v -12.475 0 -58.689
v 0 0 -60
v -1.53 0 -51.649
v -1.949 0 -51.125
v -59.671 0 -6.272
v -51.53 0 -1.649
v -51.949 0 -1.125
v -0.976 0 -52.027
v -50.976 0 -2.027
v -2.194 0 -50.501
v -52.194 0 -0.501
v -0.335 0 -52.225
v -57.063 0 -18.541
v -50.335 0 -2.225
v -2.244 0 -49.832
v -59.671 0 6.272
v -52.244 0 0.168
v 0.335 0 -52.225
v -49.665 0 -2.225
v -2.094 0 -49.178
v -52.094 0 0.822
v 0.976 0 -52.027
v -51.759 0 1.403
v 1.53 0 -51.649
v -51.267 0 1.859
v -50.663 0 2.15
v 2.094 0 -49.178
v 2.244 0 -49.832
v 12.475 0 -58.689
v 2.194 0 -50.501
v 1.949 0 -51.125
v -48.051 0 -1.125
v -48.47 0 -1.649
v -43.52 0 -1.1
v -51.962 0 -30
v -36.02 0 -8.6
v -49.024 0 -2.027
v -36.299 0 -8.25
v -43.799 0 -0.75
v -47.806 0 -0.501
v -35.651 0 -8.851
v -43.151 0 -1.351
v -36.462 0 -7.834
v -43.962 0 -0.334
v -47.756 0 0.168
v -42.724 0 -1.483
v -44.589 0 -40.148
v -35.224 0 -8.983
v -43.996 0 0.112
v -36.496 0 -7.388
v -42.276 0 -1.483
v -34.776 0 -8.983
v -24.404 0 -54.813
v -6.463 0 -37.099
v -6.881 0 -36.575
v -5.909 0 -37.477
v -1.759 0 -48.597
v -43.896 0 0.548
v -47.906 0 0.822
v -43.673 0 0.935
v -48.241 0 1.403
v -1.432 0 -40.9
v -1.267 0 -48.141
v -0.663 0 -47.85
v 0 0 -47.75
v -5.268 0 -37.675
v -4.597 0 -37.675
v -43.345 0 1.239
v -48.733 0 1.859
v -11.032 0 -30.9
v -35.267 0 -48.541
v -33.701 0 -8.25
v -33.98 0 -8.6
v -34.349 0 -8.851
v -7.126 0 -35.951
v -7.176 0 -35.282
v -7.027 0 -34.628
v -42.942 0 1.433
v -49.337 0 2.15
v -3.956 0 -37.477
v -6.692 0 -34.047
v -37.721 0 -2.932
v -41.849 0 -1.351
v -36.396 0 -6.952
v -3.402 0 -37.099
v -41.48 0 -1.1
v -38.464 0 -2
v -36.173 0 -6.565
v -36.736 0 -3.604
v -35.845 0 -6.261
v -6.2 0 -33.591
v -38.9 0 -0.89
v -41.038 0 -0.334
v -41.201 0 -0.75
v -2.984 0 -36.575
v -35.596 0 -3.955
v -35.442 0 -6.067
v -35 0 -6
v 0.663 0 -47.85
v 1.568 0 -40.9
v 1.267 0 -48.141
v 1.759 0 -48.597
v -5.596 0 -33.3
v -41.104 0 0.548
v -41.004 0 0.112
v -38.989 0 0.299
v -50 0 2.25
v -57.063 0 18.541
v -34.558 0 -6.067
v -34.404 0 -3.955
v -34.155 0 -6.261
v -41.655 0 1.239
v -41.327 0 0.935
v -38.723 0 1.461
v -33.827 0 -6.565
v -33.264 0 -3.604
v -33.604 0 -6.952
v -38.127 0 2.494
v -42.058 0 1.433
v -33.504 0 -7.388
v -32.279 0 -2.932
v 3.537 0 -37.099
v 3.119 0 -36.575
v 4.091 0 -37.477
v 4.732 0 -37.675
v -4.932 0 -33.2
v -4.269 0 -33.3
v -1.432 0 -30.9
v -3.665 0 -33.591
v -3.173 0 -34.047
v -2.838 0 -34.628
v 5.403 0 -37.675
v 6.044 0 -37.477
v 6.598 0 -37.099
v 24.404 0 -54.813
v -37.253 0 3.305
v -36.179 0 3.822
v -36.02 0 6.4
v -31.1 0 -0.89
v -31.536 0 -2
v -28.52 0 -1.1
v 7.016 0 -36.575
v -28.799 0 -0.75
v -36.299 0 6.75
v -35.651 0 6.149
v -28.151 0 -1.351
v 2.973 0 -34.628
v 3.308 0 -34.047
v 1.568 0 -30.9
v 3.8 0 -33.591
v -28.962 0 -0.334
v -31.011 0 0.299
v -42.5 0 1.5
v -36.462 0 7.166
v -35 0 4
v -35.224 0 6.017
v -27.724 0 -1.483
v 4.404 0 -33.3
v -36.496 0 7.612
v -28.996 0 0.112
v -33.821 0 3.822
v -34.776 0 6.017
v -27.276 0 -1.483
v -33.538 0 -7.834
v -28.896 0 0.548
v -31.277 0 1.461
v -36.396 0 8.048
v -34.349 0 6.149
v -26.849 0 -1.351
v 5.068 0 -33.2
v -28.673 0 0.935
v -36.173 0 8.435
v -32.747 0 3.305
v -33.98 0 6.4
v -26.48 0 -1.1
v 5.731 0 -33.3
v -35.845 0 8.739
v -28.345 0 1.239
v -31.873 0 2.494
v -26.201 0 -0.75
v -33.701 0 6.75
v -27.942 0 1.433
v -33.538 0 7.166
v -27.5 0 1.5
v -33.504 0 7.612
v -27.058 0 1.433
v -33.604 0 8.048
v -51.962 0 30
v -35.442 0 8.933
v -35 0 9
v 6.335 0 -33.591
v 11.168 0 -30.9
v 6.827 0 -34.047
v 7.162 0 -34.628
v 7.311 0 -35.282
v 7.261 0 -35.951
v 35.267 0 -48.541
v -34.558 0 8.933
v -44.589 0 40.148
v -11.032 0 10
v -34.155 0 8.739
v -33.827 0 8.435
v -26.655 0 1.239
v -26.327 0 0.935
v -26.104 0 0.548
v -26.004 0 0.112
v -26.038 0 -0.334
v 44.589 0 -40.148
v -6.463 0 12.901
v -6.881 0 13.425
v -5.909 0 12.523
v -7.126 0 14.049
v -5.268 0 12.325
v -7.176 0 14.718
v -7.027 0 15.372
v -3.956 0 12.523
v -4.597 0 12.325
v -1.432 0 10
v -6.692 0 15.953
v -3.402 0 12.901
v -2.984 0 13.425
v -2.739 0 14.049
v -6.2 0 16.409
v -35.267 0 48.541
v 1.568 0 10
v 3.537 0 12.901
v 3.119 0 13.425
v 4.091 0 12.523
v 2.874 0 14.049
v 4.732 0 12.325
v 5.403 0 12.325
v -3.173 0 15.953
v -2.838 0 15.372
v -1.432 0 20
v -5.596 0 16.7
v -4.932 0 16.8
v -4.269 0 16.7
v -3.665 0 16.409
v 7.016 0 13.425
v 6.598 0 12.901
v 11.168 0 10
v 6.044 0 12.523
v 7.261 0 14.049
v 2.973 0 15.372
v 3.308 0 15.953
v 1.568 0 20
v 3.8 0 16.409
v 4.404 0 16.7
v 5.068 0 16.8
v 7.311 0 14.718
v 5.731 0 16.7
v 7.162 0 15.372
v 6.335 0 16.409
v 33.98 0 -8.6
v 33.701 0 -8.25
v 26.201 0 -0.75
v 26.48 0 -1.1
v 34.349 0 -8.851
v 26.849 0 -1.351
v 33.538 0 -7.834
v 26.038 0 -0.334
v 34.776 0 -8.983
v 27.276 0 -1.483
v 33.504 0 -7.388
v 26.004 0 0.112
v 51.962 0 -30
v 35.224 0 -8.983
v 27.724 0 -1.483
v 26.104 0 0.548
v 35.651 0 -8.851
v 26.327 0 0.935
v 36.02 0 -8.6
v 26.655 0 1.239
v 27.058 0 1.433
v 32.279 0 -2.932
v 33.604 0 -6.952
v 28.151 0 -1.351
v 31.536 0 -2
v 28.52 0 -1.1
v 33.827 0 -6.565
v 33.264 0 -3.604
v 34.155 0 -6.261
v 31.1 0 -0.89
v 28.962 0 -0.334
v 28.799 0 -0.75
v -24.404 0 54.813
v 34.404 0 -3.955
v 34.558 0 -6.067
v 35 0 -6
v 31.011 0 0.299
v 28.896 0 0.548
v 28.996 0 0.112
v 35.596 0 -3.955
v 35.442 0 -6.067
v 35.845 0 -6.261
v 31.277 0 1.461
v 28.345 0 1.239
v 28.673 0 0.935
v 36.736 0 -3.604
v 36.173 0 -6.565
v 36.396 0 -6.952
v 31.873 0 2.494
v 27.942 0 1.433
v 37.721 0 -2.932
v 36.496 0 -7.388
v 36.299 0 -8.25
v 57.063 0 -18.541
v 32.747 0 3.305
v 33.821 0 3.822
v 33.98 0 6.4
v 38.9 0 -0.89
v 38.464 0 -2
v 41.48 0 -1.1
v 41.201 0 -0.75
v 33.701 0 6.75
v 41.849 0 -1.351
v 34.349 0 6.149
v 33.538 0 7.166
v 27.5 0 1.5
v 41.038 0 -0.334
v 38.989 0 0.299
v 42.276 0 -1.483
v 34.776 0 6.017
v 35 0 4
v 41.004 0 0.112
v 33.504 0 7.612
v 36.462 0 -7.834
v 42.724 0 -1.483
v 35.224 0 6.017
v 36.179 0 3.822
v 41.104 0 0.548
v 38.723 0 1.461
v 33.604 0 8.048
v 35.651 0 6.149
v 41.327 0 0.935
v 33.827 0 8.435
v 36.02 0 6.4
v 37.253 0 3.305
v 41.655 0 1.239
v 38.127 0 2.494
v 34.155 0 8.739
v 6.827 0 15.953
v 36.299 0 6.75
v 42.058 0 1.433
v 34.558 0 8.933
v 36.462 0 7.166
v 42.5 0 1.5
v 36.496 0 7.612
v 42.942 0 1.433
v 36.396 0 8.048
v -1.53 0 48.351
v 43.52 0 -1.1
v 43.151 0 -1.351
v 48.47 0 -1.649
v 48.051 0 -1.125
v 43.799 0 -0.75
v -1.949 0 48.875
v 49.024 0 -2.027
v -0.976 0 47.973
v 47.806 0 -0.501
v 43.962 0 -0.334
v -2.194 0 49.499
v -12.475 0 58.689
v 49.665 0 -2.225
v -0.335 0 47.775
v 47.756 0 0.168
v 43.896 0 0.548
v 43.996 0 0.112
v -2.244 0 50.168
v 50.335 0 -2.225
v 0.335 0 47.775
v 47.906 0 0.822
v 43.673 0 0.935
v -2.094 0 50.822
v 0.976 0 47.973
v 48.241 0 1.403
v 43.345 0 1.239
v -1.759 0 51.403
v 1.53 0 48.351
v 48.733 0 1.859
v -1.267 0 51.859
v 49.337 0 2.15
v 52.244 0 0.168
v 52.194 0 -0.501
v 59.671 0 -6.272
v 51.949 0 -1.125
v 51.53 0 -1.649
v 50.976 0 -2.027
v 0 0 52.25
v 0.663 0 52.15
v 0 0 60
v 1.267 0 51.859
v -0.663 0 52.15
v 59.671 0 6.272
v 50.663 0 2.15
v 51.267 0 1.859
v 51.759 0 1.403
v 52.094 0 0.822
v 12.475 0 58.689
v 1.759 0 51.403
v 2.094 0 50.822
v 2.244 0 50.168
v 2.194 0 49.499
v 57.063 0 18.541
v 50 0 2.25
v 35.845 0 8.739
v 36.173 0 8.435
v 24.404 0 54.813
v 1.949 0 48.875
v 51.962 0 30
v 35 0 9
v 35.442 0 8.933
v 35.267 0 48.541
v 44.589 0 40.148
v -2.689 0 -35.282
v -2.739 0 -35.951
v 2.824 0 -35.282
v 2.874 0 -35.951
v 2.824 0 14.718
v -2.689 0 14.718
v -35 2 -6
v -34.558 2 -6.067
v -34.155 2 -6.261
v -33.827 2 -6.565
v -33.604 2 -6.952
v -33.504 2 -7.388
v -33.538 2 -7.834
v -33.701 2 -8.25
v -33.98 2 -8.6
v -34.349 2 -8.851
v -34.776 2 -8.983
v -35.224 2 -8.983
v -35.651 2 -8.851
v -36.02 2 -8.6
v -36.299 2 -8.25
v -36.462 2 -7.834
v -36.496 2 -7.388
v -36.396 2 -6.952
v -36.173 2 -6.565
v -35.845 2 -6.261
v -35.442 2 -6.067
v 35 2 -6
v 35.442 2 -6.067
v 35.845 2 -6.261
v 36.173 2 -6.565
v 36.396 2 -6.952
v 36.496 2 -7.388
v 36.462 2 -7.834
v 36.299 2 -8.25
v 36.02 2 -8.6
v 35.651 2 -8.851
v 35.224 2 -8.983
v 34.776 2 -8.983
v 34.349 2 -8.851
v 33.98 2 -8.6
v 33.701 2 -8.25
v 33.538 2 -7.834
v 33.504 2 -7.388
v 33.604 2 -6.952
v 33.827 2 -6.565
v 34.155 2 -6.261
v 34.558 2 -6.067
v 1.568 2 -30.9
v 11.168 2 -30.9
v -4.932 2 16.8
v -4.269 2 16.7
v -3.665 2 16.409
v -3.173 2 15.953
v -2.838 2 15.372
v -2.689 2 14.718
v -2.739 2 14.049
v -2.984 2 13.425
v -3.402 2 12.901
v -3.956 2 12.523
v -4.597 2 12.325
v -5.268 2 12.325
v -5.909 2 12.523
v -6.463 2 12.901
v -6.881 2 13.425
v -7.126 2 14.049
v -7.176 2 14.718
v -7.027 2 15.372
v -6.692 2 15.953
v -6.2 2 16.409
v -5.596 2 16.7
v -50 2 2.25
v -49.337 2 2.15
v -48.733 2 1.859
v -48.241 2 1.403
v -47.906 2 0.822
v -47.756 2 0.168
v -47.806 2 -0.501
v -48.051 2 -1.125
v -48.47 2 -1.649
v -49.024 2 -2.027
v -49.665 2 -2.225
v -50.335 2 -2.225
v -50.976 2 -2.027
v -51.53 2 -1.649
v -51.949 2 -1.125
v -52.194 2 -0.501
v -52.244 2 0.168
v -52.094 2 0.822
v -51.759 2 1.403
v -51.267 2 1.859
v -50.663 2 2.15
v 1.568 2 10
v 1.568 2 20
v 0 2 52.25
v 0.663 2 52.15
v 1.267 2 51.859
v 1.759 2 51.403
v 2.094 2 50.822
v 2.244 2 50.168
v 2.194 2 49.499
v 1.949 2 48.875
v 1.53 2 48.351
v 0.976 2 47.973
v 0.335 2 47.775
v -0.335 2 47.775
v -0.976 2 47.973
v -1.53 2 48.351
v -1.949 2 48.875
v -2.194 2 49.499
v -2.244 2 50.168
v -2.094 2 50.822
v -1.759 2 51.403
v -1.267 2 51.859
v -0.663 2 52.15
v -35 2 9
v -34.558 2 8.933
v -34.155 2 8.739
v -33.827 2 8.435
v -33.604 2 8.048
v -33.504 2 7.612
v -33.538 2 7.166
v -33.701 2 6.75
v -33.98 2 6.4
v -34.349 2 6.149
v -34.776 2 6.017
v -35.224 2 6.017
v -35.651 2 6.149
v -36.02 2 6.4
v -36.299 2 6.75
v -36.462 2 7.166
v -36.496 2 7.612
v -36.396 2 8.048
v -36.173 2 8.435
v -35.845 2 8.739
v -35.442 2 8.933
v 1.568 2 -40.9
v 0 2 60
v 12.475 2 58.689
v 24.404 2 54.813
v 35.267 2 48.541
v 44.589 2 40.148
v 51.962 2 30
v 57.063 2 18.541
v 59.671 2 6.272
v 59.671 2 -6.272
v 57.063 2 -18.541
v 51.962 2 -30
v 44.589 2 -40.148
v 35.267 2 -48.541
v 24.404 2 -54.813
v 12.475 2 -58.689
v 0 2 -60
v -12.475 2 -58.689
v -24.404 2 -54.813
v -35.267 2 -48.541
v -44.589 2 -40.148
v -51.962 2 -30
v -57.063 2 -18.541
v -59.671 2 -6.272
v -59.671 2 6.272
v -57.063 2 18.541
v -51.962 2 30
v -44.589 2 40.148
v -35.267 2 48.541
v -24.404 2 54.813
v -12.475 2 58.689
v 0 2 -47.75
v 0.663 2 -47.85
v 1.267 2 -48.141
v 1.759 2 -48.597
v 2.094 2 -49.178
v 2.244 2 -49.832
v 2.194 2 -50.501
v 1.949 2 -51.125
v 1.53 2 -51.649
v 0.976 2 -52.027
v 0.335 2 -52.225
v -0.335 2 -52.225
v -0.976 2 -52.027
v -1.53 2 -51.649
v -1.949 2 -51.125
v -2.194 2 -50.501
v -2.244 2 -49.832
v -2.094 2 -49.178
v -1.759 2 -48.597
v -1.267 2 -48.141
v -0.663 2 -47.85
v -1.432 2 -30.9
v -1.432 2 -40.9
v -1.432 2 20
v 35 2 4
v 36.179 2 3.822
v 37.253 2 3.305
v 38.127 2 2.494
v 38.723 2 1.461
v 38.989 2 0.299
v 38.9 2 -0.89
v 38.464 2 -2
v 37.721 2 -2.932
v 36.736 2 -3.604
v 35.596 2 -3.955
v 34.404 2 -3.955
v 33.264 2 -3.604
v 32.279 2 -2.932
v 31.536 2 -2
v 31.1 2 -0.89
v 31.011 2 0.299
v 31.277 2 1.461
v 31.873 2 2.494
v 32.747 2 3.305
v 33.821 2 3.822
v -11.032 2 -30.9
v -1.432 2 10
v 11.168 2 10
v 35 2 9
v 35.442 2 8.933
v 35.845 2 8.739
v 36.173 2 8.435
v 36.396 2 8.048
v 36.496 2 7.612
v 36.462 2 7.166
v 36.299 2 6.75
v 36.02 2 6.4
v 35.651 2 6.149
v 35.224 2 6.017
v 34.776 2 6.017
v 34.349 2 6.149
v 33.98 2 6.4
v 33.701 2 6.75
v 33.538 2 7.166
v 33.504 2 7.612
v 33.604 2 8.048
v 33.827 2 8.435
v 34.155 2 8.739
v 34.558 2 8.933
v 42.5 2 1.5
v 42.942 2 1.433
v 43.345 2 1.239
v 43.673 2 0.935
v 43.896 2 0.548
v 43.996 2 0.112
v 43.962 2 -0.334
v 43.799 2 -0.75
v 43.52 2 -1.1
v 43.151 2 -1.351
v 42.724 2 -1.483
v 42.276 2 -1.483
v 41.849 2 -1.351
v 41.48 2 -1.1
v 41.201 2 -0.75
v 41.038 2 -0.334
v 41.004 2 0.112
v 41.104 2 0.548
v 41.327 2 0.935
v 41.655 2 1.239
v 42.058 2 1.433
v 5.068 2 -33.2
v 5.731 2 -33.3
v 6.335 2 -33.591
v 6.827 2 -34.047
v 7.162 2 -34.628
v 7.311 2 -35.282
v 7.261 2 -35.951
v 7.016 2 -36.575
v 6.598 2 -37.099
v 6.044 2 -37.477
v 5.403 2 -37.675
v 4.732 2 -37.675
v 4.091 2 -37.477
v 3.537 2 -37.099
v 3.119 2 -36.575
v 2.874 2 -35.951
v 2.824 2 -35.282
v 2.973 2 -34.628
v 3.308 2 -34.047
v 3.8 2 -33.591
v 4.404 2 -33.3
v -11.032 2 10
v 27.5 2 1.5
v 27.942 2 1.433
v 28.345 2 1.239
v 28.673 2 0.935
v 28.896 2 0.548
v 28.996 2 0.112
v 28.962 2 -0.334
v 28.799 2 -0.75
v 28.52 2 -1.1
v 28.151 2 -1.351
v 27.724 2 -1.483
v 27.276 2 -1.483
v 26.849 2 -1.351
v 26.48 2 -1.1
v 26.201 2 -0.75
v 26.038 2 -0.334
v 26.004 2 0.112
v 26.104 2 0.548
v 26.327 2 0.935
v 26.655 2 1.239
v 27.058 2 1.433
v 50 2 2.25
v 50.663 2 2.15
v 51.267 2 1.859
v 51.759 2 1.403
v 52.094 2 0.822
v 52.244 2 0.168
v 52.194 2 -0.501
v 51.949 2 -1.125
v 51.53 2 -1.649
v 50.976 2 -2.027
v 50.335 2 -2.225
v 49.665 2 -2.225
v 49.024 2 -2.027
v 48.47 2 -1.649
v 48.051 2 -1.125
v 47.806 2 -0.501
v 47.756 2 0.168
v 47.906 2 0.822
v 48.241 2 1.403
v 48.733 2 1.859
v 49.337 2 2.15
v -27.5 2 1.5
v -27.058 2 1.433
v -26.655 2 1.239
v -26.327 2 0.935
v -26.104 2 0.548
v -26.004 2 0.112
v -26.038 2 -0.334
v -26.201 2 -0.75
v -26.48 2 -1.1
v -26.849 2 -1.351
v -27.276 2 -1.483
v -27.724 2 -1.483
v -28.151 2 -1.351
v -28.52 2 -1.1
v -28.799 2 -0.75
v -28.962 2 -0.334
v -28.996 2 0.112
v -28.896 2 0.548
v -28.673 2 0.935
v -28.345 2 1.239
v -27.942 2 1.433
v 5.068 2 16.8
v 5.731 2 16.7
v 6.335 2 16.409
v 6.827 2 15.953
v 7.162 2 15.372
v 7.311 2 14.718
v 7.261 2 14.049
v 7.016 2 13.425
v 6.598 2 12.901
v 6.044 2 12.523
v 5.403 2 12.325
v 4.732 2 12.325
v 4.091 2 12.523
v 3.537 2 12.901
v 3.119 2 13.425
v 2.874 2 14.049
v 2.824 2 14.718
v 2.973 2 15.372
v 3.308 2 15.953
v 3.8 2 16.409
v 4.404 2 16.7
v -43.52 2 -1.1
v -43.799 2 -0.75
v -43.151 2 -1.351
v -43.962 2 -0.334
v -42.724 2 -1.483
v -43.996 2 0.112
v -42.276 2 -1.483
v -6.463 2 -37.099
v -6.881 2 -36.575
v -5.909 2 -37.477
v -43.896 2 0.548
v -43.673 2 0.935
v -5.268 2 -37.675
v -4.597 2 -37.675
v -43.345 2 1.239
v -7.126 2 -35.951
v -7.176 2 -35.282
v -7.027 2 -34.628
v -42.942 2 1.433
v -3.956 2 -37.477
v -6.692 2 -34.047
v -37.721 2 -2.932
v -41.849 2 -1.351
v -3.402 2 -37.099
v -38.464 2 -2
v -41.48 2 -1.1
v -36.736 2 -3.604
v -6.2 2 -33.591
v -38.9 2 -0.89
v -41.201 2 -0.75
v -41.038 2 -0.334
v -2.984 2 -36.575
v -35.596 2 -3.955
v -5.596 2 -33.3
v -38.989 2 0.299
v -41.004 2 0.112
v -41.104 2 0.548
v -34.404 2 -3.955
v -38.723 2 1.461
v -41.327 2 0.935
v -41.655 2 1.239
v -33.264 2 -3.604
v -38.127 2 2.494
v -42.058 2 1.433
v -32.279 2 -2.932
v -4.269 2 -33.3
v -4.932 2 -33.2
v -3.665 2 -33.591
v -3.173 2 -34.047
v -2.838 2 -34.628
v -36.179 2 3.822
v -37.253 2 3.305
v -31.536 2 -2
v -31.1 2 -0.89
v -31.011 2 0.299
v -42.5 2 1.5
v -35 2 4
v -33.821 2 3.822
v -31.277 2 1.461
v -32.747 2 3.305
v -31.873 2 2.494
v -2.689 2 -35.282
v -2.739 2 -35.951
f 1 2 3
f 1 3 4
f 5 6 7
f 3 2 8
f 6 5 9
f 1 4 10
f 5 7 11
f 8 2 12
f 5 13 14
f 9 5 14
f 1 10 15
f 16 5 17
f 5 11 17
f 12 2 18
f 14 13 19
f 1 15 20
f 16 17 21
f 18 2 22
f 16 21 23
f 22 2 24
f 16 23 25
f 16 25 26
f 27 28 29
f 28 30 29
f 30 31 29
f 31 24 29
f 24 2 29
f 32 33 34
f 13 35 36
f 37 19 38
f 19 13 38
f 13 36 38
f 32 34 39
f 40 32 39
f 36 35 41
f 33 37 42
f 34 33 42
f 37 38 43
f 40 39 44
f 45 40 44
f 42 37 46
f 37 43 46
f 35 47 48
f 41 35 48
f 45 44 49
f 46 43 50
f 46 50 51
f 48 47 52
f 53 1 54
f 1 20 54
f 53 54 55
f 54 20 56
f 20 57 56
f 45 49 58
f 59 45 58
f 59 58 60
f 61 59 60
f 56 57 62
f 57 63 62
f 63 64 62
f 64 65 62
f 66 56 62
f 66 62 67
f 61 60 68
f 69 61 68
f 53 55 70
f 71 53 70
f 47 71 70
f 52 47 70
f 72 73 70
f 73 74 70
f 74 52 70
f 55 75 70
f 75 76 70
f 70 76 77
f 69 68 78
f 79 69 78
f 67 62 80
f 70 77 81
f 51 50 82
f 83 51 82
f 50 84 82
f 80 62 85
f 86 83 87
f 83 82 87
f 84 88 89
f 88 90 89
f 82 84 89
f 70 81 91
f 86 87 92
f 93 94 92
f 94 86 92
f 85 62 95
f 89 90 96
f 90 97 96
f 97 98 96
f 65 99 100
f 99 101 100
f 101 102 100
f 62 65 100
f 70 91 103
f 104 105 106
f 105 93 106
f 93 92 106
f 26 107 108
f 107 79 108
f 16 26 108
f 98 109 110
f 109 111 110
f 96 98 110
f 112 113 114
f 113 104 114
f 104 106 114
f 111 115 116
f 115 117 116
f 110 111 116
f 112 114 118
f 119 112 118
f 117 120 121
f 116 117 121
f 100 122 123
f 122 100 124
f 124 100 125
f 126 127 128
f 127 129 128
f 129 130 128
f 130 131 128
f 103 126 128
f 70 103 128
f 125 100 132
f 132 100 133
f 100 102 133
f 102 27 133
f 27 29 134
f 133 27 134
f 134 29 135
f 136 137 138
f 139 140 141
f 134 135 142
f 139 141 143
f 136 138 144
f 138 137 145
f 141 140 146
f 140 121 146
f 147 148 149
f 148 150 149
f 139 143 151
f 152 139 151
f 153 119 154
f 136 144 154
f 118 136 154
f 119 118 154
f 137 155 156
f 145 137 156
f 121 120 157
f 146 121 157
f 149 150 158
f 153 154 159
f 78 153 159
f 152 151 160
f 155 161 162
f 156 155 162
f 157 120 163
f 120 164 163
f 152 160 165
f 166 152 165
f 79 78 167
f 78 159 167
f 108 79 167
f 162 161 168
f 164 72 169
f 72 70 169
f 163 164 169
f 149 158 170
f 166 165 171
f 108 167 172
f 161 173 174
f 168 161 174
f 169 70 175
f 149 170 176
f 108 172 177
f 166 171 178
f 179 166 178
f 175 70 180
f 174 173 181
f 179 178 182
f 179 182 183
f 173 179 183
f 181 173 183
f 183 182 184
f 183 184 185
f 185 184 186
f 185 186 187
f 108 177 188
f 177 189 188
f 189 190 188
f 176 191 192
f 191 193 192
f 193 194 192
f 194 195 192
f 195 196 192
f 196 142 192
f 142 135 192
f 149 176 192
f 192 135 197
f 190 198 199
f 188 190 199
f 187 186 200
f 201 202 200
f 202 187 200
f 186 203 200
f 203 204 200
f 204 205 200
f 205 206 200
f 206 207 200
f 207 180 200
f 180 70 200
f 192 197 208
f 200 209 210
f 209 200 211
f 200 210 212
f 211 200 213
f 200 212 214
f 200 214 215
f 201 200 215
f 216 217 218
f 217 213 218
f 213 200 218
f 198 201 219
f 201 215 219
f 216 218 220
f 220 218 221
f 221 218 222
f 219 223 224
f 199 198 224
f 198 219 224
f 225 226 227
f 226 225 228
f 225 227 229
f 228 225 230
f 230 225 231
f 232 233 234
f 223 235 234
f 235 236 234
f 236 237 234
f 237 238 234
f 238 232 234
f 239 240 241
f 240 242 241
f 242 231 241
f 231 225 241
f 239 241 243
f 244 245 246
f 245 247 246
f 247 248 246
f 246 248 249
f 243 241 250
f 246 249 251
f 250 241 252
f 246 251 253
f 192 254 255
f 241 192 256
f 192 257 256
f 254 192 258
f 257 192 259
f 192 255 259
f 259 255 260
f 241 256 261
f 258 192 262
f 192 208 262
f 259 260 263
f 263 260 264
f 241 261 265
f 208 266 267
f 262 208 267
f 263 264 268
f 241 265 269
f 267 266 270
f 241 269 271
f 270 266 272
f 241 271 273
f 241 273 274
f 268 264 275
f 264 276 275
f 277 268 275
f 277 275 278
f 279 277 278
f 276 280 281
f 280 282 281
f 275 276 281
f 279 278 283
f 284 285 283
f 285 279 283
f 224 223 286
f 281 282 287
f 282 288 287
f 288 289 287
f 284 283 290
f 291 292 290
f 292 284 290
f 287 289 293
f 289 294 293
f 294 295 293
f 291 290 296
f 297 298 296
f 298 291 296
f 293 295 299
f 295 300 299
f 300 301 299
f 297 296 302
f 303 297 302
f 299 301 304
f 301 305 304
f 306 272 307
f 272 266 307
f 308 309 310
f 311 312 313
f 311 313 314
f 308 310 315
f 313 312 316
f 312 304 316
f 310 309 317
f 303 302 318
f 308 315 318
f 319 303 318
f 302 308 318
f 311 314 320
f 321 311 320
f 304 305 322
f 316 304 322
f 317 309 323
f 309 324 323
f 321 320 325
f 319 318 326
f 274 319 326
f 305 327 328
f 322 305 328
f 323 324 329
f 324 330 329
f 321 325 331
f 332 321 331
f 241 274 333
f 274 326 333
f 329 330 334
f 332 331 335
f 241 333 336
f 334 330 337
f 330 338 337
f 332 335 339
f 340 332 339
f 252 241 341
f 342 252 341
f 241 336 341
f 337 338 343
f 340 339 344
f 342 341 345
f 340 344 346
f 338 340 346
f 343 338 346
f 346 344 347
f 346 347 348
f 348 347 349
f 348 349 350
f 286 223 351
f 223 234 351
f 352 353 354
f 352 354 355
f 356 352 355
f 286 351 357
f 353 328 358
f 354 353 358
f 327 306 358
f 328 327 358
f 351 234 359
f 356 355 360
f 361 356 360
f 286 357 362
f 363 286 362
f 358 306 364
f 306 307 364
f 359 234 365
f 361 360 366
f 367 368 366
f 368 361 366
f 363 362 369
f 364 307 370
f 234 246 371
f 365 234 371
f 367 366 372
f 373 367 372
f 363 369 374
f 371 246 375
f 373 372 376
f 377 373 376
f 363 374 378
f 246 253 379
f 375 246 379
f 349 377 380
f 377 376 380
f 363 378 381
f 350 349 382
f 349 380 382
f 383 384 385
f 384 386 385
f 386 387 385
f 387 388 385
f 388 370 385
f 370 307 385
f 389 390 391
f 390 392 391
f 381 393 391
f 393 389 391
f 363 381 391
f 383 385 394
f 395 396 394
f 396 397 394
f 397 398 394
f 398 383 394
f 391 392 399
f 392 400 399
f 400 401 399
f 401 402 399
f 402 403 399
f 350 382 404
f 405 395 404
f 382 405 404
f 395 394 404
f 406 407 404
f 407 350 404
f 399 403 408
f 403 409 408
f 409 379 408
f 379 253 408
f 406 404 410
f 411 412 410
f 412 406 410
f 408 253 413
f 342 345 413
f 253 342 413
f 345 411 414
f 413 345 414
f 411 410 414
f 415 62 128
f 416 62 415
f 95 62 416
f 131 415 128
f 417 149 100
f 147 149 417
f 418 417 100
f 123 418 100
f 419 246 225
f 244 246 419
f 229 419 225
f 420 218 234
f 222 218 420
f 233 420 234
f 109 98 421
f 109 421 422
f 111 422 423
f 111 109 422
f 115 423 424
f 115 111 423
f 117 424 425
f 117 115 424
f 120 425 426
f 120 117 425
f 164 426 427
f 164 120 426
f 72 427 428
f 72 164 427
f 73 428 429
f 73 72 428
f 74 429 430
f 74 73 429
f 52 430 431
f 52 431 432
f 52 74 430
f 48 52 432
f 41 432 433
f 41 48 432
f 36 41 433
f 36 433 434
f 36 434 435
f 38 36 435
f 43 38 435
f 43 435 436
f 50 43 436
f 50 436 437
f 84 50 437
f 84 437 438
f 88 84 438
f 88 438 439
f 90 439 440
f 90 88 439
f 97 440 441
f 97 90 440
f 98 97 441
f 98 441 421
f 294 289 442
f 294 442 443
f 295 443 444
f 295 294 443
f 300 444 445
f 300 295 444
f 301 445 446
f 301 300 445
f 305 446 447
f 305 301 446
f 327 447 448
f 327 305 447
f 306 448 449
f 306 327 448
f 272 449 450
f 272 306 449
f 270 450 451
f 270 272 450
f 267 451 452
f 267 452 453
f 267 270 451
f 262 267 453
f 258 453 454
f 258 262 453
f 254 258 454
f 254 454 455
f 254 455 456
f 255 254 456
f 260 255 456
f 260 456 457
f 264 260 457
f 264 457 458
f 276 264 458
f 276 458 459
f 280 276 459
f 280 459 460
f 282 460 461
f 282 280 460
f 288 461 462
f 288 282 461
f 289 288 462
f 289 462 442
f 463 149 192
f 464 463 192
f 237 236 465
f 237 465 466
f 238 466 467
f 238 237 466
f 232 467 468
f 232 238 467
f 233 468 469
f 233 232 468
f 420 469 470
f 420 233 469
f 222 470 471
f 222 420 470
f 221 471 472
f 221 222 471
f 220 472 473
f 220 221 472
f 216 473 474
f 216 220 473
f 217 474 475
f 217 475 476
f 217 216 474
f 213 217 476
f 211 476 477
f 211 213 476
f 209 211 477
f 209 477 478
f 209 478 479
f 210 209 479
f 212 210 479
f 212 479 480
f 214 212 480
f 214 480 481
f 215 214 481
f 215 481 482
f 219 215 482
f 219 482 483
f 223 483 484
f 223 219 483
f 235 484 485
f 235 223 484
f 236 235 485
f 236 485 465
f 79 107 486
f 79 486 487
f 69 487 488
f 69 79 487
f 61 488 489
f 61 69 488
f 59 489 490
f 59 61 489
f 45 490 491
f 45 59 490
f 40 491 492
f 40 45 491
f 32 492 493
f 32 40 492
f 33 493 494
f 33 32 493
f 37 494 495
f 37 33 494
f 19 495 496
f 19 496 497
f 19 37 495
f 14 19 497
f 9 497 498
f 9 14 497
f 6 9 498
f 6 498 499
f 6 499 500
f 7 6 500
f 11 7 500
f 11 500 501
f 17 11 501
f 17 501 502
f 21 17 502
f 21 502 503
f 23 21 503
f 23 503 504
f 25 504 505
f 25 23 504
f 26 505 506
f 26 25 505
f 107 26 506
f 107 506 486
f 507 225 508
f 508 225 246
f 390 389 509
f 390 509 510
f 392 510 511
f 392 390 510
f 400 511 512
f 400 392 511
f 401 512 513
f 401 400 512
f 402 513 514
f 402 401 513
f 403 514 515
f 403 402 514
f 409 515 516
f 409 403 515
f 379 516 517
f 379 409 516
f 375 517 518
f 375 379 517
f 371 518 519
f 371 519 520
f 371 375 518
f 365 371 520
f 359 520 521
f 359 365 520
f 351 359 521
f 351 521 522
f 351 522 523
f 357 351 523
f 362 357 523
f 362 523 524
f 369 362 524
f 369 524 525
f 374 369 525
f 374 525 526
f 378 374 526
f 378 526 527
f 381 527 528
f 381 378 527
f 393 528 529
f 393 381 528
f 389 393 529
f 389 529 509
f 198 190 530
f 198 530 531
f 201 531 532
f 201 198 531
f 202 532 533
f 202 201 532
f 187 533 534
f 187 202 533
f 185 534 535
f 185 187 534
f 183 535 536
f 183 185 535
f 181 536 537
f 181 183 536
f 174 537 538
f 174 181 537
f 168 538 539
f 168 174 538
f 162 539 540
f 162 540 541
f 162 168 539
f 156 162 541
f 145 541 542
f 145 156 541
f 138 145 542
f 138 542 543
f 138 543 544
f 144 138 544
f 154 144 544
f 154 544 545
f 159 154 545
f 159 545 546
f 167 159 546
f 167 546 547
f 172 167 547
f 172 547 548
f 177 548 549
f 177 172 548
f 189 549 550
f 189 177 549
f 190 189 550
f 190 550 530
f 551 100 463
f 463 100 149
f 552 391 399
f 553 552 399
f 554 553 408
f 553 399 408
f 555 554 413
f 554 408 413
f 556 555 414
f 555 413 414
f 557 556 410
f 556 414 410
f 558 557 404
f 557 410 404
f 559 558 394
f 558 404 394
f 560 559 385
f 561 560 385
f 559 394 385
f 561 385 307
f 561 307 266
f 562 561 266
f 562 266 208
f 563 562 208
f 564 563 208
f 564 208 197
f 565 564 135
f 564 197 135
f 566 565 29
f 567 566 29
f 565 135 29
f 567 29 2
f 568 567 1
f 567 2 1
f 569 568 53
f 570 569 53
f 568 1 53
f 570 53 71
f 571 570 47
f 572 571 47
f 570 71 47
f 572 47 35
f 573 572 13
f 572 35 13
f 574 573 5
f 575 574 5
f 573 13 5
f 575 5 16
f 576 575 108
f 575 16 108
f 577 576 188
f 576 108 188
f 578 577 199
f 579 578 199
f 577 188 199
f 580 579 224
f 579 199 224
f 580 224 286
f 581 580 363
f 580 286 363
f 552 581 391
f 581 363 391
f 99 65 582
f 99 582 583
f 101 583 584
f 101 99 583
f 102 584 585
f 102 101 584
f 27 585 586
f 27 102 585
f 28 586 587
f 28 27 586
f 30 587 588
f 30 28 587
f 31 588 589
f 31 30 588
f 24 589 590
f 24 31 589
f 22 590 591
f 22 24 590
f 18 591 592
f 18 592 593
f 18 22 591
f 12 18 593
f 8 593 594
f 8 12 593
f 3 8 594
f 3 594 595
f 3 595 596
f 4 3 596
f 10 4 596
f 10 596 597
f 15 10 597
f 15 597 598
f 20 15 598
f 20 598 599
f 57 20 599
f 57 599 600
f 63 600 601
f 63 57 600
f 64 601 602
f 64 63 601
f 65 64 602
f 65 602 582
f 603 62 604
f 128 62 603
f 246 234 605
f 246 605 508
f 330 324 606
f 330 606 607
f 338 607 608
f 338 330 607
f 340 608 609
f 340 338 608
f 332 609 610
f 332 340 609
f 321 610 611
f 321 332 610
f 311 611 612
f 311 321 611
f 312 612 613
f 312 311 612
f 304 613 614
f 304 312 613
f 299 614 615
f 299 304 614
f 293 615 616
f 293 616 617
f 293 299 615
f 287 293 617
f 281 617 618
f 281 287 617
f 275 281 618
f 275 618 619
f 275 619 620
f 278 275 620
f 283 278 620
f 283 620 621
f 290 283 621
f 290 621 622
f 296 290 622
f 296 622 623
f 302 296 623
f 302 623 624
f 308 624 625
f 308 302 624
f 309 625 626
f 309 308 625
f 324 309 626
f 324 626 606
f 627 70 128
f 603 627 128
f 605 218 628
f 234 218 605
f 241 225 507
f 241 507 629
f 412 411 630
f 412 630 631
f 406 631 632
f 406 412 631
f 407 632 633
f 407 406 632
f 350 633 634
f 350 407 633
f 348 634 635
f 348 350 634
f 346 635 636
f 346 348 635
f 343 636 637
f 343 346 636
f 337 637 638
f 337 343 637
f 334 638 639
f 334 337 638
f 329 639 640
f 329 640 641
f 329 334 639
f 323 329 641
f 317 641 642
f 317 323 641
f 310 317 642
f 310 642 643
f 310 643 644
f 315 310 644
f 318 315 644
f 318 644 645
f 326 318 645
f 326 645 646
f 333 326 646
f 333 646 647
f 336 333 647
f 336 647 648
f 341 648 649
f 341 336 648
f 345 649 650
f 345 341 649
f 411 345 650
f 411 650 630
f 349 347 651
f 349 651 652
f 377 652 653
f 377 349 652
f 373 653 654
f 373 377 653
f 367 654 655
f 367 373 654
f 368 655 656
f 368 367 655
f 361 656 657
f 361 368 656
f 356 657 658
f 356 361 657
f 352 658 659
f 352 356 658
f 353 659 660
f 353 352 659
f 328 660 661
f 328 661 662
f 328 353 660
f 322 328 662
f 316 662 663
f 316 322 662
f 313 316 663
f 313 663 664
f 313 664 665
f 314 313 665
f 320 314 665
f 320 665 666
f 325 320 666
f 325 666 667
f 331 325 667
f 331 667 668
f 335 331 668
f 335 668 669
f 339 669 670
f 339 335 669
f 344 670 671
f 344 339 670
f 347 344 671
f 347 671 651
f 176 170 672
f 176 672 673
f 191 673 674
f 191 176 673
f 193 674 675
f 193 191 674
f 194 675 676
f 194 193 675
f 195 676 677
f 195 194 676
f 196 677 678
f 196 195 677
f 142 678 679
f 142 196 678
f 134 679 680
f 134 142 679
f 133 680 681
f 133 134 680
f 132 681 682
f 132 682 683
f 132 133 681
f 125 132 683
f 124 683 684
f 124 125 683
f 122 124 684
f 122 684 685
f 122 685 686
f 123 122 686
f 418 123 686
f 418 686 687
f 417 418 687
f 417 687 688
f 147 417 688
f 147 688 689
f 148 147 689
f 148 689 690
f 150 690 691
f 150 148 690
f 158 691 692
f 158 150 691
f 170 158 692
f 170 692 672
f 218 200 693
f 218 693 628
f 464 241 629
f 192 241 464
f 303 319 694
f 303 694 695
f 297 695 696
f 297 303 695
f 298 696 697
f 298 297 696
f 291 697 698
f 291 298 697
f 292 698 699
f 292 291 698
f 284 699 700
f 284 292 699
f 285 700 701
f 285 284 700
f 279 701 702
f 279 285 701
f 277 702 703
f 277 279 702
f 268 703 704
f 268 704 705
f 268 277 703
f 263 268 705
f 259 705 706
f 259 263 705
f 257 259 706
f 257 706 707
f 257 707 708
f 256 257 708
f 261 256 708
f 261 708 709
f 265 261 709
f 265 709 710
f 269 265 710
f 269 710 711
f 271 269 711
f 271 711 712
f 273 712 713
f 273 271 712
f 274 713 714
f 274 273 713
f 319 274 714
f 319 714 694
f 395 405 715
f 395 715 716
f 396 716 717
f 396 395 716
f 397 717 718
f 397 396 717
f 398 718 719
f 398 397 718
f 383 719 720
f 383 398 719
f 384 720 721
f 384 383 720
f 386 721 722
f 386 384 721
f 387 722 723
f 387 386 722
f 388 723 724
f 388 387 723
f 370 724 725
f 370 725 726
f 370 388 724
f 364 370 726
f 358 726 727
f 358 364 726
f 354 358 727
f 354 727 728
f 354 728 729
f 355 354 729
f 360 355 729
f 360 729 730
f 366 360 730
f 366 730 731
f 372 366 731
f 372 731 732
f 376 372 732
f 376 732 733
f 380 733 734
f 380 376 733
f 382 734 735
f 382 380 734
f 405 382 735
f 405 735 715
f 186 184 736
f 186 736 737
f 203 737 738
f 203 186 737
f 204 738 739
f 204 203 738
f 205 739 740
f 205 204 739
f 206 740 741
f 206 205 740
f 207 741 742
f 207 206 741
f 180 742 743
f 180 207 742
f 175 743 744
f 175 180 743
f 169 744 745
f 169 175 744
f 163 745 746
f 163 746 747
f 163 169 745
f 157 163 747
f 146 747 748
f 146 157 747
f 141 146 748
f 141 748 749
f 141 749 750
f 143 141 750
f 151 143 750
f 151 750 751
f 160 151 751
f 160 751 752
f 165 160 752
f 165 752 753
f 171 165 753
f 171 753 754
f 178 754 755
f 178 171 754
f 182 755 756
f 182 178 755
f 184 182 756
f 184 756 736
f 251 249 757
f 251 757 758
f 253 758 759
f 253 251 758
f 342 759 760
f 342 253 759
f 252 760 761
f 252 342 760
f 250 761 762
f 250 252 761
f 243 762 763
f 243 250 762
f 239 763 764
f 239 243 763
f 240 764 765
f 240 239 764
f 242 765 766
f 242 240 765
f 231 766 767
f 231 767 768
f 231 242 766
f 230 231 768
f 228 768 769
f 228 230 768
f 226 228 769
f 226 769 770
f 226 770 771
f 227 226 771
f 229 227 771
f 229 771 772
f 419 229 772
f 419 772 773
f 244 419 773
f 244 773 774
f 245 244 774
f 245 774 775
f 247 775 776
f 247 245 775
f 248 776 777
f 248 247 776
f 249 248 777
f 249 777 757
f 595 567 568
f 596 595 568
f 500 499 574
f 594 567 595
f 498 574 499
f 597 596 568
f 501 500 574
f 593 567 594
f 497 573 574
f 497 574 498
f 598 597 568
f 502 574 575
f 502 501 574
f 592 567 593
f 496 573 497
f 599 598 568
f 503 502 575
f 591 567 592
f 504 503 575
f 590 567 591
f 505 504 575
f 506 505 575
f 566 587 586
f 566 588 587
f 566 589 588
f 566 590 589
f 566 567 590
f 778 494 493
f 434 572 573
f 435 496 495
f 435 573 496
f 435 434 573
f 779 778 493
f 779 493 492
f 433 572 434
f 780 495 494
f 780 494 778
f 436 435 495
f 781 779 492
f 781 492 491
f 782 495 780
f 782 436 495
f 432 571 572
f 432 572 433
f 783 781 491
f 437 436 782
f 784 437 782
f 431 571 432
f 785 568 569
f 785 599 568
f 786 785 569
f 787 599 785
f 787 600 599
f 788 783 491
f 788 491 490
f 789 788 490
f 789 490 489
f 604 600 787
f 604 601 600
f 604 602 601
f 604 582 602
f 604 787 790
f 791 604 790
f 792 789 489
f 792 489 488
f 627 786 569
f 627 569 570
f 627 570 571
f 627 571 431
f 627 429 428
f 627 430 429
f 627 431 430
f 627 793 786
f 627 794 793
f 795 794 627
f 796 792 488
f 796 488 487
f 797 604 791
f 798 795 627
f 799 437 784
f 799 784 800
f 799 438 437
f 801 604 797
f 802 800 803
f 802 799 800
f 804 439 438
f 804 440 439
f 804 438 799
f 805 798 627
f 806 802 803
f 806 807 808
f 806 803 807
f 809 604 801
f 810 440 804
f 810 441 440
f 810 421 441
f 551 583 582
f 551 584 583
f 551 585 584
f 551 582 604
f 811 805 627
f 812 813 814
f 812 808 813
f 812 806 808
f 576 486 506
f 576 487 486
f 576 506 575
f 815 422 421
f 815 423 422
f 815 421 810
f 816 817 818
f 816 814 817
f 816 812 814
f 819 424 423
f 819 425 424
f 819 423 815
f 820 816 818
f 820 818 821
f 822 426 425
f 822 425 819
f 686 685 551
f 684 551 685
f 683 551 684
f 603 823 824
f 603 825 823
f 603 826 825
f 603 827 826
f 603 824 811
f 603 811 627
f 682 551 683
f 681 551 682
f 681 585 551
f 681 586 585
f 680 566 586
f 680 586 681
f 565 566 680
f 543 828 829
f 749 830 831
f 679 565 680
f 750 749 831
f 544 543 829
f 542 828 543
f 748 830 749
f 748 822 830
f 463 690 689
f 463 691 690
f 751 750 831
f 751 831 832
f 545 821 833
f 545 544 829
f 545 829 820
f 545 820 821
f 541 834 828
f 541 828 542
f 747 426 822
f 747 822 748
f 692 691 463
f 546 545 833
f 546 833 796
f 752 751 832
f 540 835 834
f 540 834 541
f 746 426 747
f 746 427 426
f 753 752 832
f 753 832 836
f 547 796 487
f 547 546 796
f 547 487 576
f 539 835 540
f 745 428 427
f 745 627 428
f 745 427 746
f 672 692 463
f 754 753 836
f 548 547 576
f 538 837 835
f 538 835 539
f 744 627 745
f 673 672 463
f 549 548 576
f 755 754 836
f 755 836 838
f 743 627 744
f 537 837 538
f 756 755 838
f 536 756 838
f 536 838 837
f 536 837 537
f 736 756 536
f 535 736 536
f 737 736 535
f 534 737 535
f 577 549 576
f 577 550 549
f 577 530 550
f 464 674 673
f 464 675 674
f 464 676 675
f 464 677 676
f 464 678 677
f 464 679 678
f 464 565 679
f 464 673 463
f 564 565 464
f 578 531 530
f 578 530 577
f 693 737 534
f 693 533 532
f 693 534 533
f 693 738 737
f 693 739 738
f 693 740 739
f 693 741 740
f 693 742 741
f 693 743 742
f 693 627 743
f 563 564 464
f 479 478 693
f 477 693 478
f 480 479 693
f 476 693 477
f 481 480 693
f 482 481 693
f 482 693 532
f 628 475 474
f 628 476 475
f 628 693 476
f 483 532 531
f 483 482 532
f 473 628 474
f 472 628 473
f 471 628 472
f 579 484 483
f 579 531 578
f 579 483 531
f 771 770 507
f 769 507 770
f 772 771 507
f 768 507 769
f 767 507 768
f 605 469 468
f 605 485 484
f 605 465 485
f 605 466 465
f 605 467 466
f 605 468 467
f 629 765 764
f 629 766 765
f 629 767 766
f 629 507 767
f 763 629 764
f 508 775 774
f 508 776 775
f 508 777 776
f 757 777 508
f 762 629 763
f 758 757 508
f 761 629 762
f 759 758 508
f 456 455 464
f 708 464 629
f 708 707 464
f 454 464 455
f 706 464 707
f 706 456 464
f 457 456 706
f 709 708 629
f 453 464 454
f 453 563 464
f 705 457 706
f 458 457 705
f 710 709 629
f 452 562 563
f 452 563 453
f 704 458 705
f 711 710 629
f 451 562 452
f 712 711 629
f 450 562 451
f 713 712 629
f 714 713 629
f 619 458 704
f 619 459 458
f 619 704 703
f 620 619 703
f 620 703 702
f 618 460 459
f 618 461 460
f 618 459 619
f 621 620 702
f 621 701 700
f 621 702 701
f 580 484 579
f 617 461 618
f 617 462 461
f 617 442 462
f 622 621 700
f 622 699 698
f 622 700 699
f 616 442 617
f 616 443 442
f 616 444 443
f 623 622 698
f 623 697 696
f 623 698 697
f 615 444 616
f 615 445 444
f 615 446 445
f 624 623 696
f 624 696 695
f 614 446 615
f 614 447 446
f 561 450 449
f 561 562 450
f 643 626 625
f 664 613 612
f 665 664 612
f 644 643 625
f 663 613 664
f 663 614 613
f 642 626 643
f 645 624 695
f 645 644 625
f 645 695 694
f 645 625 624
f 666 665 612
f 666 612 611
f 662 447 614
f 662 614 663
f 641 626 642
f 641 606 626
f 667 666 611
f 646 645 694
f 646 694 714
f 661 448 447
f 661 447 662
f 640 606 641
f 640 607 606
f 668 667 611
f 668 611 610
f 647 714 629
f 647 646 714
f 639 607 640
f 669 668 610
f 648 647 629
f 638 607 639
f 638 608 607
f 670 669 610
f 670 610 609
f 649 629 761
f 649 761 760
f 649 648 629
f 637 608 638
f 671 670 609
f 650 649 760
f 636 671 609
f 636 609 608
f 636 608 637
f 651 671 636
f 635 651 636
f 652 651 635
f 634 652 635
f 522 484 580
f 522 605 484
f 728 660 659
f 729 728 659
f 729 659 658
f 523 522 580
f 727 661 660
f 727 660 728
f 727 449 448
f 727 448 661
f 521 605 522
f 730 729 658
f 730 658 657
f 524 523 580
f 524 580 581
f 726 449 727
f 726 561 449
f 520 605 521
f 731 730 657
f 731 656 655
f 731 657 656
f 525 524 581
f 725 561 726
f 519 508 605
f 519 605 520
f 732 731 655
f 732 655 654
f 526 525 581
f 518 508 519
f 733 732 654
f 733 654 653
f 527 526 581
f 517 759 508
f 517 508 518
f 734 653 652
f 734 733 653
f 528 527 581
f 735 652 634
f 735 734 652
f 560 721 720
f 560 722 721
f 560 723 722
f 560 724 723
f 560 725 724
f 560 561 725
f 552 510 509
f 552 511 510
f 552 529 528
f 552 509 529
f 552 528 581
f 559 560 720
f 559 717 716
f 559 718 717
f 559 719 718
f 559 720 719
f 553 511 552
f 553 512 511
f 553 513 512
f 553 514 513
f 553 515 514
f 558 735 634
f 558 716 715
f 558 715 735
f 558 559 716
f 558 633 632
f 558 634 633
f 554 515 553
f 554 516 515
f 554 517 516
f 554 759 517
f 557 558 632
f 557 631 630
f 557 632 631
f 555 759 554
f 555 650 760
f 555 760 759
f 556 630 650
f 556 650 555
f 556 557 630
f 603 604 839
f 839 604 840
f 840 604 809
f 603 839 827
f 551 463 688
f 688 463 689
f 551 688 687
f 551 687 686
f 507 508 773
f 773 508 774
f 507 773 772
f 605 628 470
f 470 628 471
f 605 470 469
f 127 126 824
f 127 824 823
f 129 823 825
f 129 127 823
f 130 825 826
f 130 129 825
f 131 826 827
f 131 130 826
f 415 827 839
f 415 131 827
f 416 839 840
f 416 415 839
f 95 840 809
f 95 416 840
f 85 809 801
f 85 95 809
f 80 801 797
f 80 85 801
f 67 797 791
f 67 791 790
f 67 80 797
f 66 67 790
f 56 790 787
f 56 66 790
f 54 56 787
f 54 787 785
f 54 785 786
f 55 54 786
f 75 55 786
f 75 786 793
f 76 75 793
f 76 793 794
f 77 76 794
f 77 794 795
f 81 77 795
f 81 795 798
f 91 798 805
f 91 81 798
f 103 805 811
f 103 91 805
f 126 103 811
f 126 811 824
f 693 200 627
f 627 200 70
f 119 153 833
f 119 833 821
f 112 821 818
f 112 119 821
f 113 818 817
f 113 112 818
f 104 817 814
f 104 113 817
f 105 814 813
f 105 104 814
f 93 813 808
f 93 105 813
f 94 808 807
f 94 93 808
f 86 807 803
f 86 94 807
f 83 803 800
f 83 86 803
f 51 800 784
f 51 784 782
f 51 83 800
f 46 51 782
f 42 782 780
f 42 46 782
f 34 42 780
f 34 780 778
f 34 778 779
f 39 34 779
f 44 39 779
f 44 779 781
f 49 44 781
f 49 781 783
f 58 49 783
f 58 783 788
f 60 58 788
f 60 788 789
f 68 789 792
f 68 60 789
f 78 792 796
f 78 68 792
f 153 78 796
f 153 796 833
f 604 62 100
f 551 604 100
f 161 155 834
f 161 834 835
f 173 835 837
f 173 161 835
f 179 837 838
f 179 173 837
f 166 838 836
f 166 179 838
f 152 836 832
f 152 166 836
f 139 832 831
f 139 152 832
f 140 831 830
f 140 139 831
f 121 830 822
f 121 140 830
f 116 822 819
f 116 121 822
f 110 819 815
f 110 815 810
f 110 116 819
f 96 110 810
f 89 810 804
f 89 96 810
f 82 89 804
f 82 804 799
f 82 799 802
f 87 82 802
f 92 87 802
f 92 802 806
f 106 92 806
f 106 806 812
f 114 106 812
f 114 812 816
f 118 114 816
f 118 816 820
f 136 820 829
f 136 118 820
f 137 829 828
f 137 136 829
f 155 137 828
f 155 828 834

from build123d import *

# Parameters (mm, degrees)
SKETCH1_R               = 60
SKETCH1_R_2             = 2.25
SKETCH1_R_3             = 4
SKETCH1_R_4             = 1.5
SKETCH1_W               = 22.2
SKETCH1_H               = 40.9
BOSS_EXTRUDE1_DEPTH     = 2
SKETCH2_W               = 3
SKETCH2_H               = 10
CUT_EXTRUDE_THIN1_DEPTH = 85.876380696


with BuildPart() as part:
    # Sketch1 → Boss-Extrude1 (new body)
    with BuildSketch(Plane(origin=(0, 0, 0), x_dir=(1, 0, 0), z_dir=(0, 1, 0))):
        with Locations(Location((0, 0, 0), (0, 0, 270))):
            Circle(SKETCH1_R)
        with Locations(Location((0, 50, 0), (0, 0, 270))):
            Circle(SKETCH1_R_2, mode=Mode.SUBTRACT)
        with Locations(Location((50, 0, 0), (0, 0, 270))):
            Circle(SKETCH1_R_2, mode=Mode.SUBTRACT)
        with Locations(Location((0, -50, 0), (0, 0, 270))):
            Circle(SKETCH1_R_2, mode=Mode.SUBTRACT)
        with Locations(Location((-50, 0, 0), (0, 0, 270))):
            Circle(SKETCH1_R_2, mode=Mode.SUBTRACT)
        with Locations(Location((-4.932420963, 35.45, 0), (0, 0, 270))):
            Circle(SKETCH1_R_2, mode=Mode.SUBTRACT)
        with Locations(Location((5.067579037, 35.45, 0), (0, 0, 270))):
            Circle(SKETCH1_R_2, mode=Mode.SUBTRACT)
        with Locations(Location((5.067579037, -14.55, 0), (0, 0, 270))):
            Circle(SKETCH1_R_2, mode=Mode.SUBTRACT)
        with Locations(Location((-4.932420963, -14.55, 0), (0, 0, 270))):
            Circle(SKETCH1_R_2, mode=Mode.SUBTRACT)
        with Locations(Location((-35, 0, 0), (0, 0, 270))):
            Circle(SKETCH1_R_3, mode=Mode.SUBTRACT)
        with Locations(Location((-42.5, 0, 0), (0, 0, 270))):
            Circle(SKETCH1_R_4, mode=Mode.SUBTRACT)
        with Locations(Location((-35, 7.5, 0), (0, 0, 270))):
            Circle(SKETCH1_R_4, mode=Mode.SUBTRACT)
        with Locations(Location((-27.5, 0, 0), (0, 0, 270))):
            Circle(SKETCH1_R_4, mode=Mode.SUBTRACT)
        with Locations(Location((-35, -7.5, 0), (0, 0, 270))):
            Circle(SKETCH1_R_4, mode=Mode.SUBTRACT)
        with Locations(Location((42.5, 0, 0), (0, 0, 270))):
            Circle(SKETCH1_R_4, mode=Mode.SUBTRACT)
        with Locations(Location((35, 0, 0), (0, 0, 270))):
            Circle(SKETCH1_R_3, mode=Mode.SUBTRACT)
        with Locations(Location((35, -7.5, 0), (0, 0, 270))):
            Circle(SKETCH1_R_4, mode=Mode.SUBTRACT)
        with Locations(Location((27.5, 0, 0), (0, 0, 270))):
            Circle(SKETCH1_R_4, mode=Mode.SUBTRACT)
        with Locations(Location((35, 7.5, 0), (0, 0, 270))):
            Circle(SKETCH1_R_4, mode=Mode.SUBTRACT)
        with Locations((0.067579037, 10.45)):
            Rectangle(SKETCH1_W, SKETCH1_H, mode=Mode.SUBTRACT)
    extrude(amount=BOSS_EXTRUDE1_DEPTH)

    # Sketch2 → Cut-Extrude-Thin1 (cut, through all)
    with BuildSketch(Plane.XZ):
        with Locations((0.067579037, 15)):
            Rectangle(SKETCH2_W, SKETCH2_H)
        with Locations((0.067579037, -35.9)):
            Rectangle(SKETCH2_W, SKETCH2_H)
    extrude(amount=-CUT_EXTRUDE_THIN1_DEPTH, mode=Mode.SUBTRACT)


solid = part.part
